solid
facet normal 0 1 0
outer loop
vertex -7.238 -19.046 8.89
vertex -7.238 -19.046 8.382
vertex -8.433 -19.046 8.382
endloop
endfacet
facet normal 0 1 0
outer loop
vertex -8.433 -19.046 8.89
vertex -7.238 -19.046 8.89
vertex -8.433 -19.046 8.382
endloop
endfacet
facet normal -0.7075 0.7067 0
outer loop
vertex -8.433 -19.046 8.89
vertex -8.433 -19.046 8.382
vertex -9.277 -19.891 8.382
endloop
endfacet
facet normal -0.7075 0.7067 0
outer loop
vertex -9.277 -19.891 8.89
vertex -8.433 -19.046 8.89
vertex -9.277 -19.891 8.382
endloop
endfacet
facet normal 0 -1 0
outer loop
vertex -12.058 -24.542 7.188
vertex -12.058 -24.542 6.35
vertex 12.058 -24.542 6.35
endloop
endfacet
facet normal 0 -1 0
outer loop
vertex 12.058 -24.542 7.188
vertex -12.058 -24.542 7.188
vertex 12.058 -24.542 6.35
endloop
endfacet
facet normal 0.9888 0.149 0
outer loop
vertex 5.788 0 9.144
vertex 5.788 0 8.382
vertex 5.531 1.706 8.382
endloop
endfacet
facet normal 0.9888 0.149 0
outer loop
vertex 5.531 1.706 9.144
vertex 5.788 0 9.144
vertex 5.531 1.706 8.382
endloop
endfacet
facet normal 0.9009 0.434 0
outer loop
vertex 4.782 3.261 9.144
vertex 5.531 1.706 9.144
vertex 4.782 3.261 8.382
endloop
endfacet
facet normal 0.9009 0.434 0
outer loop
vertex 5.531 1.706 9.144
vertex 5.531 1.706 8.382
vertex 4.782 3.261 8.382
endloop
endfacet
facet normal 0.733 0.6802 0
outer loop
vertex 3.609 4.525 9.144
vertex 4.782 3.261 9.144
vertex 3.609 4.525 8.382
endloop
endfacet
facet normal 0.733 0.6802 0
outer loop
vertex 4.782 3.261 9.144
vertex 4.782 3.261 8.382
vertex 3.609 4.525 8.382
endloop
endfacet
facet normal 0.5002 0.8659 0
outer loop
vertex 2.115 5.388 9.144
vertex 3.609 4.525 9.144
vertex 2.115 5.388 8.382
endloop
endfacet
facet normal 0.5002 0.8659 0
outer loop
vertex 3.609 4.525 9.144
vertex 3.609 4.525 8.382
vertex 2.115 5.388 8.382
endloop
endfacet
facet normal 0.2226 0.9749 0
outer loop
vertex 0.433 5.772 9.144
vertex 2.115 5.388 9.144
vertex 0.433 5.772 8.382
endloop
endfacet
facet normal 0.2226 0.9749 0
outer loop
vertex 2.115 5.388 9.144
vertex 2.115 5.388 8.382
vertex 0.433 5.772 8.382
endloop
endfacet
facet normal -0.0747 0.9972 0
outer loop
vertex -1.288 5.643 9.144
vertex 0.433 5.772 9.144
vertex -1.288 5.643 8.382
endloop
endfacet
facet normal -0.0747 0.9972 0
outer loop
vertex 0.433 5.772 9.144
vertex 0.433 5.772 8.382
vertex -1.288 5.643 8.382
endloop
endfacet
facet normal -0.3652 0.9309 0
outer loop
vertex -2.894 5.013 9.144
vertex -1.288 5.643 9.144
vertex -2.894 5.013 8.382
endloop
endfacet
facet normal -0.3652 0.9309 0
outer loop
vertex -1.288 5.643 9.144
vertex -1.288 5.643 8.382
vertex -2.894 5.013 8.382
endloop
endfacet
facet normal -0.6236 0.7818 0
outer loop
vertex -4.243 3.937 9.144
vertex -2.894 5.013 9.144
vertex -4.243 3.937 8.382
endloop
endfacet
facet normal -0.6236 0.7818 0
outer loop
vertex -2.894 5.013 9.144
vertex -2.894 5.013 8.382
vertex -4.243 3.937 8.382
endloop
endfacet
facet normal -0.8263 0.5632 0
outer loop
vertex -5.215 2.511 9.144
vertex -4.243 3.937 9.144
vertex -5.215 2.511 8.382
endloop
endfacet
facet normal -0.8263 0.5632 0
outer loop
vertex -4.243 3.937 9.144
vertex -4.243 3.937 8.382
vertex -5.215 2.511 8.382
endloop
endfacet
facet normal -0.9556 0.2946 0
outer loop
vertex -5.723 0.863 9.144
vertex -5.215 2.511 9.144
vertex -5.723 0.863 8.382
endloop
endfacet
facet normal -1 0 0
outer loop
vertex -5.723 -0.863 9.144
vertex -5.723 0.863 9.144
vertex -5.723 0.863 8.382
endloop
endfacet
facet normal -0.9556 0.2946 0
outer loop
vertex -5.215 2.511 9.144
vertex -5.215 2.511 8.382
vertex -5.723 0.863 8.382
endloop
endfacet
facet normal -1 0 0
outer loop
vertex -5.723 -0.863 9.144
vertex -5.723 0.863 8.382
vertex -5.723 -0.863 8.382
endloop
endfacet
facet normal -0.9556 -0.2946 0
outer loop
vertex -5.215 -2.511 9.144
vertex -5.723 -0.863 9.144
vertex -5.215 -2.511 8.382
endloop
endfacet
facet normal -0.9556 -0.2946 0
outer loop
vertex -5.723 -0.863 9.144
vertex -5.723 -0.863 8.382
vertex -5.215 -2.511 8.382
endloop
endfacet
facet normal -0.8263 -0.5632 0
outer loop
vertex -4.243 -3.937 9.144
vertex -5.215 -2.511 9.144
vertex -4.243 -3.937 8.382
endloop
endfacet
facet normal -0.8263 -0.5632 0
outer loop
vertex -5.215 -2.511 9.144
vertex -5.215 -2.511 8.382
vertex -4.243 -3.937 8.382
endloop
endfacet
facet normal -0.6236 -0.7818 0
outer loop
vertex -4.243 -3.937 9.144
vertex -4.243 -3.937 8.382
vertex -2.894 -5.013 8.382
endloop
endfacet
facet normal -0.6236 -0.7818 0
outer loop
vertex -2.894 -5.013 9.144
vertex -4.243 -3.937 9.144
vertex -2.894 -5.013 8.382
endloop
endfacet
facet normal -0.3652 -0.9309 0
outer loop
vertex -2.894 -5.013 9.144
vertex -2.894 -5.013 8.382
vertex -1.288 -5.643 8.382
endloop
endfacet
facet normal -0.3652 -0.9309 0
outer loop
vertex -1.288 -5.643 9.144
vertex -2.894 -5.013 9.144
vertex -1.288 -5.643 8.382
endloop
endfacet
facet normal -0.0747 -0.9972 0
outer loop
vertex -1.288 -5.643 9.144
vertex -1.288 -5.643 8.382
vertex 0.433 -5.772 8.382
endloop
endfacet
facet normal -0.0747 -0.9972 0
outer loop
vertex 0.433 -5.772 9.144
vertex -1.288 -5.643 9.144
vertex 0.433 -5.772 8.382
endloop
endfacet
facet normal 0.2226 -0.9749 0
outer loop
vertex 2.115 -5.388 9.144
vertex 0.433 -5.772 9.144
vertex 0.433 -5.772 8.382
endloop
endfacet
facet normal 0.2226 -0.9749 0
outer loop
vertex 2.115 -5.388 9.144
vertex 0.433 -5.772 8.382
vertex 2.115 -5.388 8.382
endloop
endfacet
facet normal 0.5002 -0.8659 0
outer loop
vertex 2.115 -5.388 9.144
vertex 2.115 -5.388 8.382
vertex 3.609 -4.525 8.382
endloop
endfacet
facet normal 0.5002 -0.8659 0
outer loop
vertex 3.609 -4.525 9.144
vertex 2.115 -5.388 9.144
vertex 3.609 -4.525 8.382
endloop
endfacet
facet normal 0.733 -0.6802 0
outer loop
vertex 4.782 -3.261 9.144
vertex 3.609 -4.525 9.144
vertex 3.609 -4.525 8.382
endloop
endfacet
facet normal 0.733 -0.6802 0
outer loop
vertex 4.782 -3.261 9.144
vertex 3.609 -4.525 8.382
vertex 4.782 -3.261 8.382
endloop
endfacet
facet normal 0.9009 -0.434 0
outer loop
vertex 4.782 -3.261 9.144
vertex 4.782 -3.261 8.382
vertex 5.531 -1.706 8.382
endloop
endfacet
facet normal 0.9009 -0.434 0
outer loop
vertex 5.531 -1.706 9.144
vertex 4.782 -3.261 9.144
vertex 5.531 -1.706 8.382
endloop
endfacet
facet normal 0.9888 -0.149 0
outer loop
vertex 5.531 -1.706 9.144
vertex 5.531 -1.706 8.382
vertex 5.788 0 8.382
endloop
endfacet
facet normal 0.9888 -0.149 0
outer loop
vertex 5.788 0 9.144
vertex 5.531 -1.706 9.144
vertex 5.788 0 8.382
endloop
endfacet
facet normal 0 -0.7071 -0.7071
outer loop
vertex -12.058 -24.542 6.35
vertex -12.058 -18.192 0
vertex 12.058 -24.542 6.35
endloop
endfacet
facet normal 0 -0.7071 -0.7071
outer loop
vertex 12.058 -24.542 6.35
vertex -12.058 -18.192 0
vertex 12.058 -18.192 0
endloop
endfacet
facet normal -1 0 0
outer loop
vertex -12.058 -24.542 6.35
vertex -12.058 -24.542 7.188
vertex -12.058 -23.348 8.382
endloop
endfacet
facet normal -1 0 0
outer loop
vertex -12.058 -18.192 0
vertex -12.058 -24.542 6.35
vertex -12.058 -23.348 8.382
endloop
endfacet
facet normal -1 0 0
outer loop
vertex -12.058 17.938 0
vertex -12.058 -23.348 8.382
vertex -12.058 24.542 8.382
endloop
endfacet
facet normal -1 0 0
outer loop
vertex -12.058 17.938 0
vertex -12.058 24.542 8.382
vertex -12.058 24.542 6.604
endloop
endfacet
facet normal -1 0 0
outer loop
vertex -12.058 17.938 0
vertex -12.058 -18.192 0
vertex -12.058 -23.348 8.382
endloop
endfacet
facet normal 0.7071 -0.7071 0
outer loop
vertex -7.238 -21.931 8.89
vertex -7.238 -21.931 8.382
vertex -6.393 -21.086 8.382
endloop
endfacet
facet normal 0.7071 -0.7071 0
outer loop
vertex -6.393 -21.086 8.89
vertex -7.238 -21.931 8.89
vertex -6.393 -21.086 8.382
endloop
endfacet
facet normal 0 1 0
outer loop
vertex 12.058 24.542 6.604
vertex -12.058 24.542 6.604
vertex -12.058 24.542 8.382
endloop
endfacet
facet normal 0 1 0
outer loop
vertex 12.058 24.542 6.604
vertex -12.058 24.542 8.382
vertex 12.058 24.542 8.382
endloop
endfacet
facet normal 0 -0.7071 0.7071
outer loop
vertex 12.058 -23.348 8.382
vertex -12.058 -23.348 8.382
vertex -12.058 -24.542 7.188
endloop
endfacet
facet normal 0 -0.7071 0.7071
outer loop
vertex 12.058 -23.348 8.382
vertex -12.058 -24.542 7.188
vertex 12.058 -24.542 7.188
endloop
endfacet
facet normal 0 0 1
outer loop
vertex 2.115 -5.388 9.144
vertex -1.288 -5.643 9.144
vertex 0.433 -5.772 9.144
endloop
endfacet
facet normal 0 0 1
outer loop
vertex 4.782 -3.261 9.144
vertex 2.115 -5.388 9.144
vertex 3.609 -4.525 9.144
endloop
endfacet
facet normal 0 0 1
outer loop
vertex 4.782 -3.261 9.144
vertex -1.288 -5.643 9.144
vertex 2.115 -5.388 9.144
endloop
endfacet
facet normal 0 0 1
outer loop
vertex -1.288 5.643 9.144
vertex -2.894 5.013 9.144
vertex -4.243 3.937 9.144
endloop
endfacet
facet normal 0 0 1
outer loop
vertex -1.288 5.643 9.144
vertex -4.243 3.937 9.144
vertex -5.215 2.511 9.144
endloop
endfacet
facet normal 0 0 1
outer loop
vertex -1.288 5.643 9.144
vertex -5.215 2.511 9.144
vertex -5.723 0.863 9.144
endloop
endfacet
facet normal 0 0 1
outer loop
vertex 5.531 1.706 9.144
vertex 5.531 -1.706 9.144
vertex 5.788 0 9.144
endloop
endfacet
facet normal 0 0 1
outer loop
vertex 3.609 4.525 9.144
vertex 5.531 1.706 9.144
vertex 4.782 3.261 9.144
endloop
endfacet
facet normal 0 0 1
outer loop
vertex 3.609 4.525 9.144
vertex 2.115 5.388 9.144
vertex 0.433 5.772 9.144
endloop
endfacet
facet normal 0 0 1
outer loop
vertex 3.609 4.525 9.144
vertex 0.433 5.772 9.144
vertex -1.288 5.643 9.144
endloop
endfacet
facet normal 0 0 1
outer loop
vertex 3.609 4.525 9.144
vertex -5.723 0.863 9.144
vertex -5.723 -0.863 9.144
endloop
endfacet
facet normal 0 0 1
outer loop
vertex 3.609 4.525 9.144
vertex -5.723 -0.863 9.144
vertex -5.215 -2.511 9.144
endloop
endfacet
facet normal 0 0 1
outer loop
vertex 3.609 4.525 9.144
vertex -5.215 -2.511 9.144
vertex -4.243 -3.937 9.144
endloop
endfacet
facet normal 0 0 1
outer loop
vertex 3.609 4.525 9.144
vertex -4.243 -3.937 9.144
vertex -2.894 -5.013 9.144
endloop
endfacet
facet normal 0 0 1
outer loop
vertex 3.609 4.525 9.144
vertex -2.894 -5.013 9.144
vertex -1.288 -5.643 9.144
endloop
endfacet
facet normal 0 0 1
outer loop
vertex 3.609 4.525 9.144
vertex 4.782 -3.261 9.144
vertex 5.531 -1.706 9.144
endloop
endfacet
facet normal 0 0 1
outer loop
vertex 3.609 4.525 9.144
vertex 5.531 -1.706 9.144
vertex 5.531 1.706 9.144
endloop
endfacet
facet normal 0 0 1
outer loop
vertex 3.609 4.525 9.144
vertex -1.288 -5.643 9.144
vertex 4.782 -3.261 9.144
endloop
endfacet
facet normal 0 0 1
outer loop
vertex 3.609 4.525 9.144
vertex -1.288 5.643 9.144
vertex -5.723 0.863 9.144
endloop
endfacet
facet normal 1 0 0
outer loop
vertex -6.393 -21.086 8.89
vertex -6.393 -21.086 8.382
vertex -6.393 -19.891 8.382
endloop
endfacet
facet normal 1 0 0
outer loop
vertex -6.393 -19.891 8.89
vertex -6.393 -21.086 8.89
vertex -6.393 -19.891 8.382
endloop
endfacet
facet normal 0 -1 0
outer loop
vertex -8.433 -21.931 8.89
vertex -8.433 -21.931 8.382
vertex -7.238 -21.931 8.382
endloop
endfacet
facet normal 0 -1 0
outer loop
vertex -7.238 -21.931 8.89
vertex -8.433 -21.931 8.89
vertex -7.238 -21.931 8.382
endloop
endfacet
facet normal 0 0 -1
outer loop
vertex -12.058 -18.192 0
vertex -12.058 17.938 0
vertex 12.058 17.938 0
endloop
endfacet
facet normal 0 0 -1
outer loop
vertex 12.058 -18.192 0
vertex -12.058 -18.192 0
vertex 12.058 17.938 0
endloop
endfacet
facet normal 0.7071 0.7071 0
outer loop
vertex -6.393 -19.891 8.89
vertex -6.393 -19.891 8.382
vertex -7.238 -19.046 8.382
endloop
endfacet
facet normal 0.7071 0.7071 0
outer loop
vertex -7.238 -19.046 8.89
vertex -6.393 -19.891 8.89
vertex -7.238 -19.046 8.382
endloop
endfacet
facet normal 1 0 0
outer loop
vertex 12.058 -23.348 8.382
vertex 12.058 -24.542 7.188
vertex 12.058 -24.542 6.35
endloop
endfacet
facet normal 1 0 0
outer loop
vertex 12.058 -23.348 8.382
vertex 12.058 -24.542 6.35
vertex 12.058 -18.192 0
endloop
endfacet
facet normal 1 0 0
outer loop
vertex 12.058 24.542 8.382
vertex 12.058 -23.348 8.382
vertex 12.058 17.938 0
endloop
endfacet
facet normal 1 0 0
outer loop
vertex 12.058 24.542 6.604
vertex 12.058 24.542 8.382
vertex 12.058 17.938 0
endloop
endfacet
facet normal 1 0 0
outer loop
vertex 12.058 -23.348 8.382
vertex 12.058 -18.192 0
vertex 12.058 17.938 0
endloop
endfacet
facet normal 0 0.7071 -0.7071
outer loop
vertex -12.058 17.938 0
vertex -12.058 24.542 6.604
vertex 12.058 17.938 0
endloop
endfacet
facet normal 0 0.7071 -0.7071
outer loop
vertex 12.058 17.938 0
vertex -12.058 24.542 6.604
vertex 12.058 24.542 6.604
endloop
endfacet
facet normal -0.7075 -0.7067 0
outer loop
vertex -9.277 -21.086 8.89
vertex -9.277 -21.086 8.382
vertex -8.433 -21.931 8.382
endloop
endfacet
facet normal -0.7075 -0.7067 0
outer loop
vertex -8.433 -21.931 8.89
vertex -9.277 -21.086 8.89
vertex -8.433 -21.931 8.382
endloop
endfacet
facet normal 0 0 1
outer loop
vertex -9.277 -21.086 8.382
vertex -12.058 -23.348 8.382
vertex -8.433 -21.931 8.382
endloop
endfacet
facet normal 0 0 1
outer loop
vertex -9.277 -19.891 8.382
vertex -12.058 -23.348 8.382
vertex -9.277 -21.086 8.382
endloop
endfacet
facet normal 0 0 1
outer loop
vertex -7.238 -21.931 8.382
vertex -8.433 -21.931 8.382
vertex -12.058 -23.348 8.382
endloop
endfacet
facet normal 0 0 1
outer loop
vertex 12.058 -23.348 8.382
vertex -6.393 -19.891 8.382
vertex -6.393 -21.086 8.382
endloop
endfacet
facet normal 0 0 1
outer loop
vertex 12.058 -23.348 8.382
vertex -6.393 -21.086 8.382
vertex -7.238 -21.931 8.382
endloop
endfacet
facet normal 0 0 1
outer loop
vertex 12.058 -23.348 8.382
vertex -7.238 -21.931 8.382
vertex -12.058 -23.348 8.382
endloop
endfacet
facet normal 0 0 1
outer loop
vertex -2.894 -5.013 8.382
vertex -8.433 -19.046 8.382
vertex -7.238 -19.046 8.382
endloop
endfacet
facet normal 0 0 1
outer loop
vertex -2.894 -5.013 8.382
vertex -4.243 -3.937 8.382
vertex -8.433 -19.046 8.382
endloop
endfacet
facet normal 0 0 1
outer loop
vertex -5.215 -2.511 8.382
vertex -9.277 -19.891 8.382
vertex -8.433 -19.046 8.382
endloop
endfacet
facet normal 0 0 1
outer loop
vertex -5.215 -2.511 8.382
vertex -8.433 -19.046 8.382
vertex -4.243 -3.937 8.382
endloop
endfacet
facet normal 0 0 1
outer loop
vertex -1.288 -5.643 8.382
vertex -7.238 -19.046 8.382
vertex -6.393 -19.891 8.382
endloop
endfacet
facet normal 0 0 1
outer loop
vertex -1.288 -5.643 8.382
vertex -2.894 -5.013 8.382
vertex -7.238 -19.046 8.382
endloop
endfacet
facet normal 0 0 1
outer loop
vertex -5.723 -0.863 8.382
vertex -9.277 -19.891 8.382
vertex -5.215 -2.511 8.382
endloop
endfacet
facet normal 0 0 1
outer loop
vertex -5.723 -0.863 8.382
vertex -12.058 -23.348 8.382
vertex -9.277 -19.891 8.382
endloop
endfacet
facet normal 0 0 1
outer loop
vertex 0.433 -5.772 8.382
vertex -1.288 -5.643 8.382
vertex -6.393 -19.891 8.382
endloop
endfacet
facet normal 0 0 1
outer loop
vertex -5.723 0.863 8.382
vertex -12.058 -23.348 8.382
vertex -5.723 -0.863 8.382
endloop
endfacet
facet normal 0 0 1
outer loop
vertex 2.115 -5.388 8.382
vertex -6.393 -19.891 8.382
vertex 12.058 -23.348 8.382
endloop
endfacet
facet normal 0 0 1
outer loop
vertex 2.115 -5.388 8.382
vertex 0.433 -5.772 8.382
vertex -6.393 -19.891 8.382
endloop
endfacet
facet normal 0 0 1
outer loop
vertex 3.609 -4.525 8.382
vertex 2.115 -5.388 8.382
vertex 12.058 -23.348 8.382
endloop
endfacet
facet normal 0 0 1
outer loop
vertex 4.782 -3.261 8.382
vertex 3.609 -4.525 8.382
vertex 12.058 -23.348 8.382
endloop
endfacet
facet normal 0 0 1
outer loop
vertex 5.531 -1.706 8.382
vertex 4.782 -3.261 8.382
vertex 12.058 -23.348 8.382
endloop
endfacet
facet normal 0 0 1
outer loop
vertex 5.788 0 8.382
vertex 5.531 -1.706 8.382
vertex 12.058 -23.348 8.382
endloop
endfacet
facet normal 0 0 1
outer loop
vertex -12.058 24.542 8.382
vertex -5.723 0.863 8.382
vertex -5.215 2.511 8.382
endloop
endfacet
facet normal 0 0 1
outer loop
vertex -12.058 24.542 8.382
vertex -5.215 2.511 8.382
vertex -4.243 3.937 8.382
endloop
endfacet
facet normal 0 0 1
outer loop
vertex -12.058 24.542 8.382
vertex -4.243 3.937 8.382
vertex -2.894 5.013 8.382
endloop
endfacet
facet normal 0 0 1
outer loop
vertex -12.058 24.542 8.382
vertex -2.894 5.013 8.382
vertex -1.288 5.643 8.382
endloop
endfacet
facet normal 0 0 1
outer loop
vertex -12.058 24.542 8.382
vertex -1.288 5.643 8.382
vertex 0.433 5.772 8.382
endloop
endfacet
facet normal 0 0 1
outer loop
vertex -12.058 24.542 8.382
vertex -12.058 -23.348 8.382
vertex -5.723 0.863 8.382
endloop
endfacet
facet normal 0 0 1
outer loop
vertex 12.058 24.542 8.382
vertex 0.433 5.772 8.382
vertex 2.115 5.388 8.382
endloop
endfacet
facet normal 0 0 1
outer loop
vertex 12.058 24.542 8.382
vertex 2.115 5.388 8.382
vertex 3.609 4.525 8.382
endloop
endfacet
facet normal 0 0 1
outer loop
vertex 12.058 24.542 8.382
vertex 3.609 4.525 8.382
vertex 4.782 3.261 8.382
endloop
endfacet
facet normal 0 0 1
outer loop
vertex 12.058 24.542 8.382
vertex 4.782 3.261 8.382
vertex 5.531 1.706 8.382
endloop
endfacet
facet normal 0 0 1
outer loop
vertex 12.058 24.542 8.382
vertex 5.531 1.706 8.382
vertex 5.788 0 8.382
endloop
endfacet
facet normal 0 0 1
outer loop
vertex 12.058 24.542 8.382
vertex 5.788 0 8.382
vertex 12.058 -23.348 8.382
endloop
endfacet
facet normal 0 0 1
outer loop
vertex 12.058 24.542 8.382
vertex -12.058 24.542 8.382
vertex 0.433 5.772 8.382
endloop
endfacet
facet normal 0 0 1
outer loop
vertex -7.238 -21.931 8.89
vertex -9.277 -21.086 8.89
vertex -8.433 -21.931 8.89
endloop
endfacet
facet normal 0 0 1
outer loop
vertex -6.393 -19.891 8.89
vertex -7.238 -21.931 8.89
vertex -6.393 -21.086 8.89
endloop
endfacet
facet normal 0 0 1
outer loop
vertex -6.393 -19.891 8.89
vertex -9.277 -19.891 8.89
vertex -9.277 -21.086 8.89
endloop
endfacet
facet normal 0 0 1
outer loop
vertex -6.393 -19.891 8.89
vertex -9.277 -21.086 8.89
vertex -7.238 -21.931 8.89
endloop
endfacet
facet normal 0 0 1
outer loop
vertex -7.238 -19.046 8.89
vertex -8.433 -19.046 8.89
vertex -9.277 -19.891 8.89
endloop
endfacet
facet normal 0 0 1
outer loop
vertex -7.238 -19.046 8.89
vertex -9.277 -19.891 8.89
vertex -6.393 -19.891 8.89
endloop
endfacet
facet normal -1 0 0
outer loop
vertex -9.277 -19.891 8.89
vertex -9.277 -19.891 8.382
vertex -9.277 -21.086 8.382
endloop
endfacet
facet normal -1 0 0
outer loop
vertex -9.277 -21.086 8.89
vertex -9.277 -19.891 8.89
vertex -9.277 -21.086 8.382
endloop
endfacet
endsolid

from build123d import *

# Parameters (mm, degrees)
F0_W     = 24.116488
F0_H     = 49.084154
F1_DEPTH = 8.382
F2_SIZE  = 6.35
F3_SIZE  = 6.604
F4_R     = 5.788051
F5_DEPTH = 9.144
F7_DEPTH = 0.508
F8_SIZE  = 1.1938


with BuildPart() as f1:
    # F0 (on Top) → F1 (new body)
    with BuildSketch(Plane.XY):
        Rectangle(F0_W, F0_H)
    extrude(amount=F1_DEPTH)

    # F2
    f2_edges = [f1.edges().sort_by_distance(p)[0] for p in [
        (0, -24.542077, 0),
    ]]
    chamfer(f2_edges, length=F2_SIZE)

    # F3
    f3_edges = [f1.edges().sort_by_distance(p)[0] for p in [
        (0, 24.542077, 0),
    ]]
    chamfer(f3_edges, length=F3_SIZE)

    # F4 (on Top) → F5 (join)
    with BuildSketch(Plane.XY):
        Circle(F4_R)
    extrude(amount=F5_DEPTH)

    # F6 (on face) → F7 (join)
    with BuildSketch(Plane.XY.offset(8.382)):
        Polygon((-8.432594, -21.930741), (-7.237773, -21.930741), (-6.392907, -21.085875), (-6.392907, -19.891055), (-7.237773, -19.046189), (-8.432594, -19.046189), (-9.277459, -19.891055), (-9.277459, -21.085875), align=None)
    extrude(amount=F7_DEPTH)

    # F8
    f8_edges = [f1.edges().sort_by_distance(p)[0] for p in [
        (0, -24.542077, 8.382),
    ]]
    chamfer(f8_edges, length=F8_SIZE)


solid = f1.part
